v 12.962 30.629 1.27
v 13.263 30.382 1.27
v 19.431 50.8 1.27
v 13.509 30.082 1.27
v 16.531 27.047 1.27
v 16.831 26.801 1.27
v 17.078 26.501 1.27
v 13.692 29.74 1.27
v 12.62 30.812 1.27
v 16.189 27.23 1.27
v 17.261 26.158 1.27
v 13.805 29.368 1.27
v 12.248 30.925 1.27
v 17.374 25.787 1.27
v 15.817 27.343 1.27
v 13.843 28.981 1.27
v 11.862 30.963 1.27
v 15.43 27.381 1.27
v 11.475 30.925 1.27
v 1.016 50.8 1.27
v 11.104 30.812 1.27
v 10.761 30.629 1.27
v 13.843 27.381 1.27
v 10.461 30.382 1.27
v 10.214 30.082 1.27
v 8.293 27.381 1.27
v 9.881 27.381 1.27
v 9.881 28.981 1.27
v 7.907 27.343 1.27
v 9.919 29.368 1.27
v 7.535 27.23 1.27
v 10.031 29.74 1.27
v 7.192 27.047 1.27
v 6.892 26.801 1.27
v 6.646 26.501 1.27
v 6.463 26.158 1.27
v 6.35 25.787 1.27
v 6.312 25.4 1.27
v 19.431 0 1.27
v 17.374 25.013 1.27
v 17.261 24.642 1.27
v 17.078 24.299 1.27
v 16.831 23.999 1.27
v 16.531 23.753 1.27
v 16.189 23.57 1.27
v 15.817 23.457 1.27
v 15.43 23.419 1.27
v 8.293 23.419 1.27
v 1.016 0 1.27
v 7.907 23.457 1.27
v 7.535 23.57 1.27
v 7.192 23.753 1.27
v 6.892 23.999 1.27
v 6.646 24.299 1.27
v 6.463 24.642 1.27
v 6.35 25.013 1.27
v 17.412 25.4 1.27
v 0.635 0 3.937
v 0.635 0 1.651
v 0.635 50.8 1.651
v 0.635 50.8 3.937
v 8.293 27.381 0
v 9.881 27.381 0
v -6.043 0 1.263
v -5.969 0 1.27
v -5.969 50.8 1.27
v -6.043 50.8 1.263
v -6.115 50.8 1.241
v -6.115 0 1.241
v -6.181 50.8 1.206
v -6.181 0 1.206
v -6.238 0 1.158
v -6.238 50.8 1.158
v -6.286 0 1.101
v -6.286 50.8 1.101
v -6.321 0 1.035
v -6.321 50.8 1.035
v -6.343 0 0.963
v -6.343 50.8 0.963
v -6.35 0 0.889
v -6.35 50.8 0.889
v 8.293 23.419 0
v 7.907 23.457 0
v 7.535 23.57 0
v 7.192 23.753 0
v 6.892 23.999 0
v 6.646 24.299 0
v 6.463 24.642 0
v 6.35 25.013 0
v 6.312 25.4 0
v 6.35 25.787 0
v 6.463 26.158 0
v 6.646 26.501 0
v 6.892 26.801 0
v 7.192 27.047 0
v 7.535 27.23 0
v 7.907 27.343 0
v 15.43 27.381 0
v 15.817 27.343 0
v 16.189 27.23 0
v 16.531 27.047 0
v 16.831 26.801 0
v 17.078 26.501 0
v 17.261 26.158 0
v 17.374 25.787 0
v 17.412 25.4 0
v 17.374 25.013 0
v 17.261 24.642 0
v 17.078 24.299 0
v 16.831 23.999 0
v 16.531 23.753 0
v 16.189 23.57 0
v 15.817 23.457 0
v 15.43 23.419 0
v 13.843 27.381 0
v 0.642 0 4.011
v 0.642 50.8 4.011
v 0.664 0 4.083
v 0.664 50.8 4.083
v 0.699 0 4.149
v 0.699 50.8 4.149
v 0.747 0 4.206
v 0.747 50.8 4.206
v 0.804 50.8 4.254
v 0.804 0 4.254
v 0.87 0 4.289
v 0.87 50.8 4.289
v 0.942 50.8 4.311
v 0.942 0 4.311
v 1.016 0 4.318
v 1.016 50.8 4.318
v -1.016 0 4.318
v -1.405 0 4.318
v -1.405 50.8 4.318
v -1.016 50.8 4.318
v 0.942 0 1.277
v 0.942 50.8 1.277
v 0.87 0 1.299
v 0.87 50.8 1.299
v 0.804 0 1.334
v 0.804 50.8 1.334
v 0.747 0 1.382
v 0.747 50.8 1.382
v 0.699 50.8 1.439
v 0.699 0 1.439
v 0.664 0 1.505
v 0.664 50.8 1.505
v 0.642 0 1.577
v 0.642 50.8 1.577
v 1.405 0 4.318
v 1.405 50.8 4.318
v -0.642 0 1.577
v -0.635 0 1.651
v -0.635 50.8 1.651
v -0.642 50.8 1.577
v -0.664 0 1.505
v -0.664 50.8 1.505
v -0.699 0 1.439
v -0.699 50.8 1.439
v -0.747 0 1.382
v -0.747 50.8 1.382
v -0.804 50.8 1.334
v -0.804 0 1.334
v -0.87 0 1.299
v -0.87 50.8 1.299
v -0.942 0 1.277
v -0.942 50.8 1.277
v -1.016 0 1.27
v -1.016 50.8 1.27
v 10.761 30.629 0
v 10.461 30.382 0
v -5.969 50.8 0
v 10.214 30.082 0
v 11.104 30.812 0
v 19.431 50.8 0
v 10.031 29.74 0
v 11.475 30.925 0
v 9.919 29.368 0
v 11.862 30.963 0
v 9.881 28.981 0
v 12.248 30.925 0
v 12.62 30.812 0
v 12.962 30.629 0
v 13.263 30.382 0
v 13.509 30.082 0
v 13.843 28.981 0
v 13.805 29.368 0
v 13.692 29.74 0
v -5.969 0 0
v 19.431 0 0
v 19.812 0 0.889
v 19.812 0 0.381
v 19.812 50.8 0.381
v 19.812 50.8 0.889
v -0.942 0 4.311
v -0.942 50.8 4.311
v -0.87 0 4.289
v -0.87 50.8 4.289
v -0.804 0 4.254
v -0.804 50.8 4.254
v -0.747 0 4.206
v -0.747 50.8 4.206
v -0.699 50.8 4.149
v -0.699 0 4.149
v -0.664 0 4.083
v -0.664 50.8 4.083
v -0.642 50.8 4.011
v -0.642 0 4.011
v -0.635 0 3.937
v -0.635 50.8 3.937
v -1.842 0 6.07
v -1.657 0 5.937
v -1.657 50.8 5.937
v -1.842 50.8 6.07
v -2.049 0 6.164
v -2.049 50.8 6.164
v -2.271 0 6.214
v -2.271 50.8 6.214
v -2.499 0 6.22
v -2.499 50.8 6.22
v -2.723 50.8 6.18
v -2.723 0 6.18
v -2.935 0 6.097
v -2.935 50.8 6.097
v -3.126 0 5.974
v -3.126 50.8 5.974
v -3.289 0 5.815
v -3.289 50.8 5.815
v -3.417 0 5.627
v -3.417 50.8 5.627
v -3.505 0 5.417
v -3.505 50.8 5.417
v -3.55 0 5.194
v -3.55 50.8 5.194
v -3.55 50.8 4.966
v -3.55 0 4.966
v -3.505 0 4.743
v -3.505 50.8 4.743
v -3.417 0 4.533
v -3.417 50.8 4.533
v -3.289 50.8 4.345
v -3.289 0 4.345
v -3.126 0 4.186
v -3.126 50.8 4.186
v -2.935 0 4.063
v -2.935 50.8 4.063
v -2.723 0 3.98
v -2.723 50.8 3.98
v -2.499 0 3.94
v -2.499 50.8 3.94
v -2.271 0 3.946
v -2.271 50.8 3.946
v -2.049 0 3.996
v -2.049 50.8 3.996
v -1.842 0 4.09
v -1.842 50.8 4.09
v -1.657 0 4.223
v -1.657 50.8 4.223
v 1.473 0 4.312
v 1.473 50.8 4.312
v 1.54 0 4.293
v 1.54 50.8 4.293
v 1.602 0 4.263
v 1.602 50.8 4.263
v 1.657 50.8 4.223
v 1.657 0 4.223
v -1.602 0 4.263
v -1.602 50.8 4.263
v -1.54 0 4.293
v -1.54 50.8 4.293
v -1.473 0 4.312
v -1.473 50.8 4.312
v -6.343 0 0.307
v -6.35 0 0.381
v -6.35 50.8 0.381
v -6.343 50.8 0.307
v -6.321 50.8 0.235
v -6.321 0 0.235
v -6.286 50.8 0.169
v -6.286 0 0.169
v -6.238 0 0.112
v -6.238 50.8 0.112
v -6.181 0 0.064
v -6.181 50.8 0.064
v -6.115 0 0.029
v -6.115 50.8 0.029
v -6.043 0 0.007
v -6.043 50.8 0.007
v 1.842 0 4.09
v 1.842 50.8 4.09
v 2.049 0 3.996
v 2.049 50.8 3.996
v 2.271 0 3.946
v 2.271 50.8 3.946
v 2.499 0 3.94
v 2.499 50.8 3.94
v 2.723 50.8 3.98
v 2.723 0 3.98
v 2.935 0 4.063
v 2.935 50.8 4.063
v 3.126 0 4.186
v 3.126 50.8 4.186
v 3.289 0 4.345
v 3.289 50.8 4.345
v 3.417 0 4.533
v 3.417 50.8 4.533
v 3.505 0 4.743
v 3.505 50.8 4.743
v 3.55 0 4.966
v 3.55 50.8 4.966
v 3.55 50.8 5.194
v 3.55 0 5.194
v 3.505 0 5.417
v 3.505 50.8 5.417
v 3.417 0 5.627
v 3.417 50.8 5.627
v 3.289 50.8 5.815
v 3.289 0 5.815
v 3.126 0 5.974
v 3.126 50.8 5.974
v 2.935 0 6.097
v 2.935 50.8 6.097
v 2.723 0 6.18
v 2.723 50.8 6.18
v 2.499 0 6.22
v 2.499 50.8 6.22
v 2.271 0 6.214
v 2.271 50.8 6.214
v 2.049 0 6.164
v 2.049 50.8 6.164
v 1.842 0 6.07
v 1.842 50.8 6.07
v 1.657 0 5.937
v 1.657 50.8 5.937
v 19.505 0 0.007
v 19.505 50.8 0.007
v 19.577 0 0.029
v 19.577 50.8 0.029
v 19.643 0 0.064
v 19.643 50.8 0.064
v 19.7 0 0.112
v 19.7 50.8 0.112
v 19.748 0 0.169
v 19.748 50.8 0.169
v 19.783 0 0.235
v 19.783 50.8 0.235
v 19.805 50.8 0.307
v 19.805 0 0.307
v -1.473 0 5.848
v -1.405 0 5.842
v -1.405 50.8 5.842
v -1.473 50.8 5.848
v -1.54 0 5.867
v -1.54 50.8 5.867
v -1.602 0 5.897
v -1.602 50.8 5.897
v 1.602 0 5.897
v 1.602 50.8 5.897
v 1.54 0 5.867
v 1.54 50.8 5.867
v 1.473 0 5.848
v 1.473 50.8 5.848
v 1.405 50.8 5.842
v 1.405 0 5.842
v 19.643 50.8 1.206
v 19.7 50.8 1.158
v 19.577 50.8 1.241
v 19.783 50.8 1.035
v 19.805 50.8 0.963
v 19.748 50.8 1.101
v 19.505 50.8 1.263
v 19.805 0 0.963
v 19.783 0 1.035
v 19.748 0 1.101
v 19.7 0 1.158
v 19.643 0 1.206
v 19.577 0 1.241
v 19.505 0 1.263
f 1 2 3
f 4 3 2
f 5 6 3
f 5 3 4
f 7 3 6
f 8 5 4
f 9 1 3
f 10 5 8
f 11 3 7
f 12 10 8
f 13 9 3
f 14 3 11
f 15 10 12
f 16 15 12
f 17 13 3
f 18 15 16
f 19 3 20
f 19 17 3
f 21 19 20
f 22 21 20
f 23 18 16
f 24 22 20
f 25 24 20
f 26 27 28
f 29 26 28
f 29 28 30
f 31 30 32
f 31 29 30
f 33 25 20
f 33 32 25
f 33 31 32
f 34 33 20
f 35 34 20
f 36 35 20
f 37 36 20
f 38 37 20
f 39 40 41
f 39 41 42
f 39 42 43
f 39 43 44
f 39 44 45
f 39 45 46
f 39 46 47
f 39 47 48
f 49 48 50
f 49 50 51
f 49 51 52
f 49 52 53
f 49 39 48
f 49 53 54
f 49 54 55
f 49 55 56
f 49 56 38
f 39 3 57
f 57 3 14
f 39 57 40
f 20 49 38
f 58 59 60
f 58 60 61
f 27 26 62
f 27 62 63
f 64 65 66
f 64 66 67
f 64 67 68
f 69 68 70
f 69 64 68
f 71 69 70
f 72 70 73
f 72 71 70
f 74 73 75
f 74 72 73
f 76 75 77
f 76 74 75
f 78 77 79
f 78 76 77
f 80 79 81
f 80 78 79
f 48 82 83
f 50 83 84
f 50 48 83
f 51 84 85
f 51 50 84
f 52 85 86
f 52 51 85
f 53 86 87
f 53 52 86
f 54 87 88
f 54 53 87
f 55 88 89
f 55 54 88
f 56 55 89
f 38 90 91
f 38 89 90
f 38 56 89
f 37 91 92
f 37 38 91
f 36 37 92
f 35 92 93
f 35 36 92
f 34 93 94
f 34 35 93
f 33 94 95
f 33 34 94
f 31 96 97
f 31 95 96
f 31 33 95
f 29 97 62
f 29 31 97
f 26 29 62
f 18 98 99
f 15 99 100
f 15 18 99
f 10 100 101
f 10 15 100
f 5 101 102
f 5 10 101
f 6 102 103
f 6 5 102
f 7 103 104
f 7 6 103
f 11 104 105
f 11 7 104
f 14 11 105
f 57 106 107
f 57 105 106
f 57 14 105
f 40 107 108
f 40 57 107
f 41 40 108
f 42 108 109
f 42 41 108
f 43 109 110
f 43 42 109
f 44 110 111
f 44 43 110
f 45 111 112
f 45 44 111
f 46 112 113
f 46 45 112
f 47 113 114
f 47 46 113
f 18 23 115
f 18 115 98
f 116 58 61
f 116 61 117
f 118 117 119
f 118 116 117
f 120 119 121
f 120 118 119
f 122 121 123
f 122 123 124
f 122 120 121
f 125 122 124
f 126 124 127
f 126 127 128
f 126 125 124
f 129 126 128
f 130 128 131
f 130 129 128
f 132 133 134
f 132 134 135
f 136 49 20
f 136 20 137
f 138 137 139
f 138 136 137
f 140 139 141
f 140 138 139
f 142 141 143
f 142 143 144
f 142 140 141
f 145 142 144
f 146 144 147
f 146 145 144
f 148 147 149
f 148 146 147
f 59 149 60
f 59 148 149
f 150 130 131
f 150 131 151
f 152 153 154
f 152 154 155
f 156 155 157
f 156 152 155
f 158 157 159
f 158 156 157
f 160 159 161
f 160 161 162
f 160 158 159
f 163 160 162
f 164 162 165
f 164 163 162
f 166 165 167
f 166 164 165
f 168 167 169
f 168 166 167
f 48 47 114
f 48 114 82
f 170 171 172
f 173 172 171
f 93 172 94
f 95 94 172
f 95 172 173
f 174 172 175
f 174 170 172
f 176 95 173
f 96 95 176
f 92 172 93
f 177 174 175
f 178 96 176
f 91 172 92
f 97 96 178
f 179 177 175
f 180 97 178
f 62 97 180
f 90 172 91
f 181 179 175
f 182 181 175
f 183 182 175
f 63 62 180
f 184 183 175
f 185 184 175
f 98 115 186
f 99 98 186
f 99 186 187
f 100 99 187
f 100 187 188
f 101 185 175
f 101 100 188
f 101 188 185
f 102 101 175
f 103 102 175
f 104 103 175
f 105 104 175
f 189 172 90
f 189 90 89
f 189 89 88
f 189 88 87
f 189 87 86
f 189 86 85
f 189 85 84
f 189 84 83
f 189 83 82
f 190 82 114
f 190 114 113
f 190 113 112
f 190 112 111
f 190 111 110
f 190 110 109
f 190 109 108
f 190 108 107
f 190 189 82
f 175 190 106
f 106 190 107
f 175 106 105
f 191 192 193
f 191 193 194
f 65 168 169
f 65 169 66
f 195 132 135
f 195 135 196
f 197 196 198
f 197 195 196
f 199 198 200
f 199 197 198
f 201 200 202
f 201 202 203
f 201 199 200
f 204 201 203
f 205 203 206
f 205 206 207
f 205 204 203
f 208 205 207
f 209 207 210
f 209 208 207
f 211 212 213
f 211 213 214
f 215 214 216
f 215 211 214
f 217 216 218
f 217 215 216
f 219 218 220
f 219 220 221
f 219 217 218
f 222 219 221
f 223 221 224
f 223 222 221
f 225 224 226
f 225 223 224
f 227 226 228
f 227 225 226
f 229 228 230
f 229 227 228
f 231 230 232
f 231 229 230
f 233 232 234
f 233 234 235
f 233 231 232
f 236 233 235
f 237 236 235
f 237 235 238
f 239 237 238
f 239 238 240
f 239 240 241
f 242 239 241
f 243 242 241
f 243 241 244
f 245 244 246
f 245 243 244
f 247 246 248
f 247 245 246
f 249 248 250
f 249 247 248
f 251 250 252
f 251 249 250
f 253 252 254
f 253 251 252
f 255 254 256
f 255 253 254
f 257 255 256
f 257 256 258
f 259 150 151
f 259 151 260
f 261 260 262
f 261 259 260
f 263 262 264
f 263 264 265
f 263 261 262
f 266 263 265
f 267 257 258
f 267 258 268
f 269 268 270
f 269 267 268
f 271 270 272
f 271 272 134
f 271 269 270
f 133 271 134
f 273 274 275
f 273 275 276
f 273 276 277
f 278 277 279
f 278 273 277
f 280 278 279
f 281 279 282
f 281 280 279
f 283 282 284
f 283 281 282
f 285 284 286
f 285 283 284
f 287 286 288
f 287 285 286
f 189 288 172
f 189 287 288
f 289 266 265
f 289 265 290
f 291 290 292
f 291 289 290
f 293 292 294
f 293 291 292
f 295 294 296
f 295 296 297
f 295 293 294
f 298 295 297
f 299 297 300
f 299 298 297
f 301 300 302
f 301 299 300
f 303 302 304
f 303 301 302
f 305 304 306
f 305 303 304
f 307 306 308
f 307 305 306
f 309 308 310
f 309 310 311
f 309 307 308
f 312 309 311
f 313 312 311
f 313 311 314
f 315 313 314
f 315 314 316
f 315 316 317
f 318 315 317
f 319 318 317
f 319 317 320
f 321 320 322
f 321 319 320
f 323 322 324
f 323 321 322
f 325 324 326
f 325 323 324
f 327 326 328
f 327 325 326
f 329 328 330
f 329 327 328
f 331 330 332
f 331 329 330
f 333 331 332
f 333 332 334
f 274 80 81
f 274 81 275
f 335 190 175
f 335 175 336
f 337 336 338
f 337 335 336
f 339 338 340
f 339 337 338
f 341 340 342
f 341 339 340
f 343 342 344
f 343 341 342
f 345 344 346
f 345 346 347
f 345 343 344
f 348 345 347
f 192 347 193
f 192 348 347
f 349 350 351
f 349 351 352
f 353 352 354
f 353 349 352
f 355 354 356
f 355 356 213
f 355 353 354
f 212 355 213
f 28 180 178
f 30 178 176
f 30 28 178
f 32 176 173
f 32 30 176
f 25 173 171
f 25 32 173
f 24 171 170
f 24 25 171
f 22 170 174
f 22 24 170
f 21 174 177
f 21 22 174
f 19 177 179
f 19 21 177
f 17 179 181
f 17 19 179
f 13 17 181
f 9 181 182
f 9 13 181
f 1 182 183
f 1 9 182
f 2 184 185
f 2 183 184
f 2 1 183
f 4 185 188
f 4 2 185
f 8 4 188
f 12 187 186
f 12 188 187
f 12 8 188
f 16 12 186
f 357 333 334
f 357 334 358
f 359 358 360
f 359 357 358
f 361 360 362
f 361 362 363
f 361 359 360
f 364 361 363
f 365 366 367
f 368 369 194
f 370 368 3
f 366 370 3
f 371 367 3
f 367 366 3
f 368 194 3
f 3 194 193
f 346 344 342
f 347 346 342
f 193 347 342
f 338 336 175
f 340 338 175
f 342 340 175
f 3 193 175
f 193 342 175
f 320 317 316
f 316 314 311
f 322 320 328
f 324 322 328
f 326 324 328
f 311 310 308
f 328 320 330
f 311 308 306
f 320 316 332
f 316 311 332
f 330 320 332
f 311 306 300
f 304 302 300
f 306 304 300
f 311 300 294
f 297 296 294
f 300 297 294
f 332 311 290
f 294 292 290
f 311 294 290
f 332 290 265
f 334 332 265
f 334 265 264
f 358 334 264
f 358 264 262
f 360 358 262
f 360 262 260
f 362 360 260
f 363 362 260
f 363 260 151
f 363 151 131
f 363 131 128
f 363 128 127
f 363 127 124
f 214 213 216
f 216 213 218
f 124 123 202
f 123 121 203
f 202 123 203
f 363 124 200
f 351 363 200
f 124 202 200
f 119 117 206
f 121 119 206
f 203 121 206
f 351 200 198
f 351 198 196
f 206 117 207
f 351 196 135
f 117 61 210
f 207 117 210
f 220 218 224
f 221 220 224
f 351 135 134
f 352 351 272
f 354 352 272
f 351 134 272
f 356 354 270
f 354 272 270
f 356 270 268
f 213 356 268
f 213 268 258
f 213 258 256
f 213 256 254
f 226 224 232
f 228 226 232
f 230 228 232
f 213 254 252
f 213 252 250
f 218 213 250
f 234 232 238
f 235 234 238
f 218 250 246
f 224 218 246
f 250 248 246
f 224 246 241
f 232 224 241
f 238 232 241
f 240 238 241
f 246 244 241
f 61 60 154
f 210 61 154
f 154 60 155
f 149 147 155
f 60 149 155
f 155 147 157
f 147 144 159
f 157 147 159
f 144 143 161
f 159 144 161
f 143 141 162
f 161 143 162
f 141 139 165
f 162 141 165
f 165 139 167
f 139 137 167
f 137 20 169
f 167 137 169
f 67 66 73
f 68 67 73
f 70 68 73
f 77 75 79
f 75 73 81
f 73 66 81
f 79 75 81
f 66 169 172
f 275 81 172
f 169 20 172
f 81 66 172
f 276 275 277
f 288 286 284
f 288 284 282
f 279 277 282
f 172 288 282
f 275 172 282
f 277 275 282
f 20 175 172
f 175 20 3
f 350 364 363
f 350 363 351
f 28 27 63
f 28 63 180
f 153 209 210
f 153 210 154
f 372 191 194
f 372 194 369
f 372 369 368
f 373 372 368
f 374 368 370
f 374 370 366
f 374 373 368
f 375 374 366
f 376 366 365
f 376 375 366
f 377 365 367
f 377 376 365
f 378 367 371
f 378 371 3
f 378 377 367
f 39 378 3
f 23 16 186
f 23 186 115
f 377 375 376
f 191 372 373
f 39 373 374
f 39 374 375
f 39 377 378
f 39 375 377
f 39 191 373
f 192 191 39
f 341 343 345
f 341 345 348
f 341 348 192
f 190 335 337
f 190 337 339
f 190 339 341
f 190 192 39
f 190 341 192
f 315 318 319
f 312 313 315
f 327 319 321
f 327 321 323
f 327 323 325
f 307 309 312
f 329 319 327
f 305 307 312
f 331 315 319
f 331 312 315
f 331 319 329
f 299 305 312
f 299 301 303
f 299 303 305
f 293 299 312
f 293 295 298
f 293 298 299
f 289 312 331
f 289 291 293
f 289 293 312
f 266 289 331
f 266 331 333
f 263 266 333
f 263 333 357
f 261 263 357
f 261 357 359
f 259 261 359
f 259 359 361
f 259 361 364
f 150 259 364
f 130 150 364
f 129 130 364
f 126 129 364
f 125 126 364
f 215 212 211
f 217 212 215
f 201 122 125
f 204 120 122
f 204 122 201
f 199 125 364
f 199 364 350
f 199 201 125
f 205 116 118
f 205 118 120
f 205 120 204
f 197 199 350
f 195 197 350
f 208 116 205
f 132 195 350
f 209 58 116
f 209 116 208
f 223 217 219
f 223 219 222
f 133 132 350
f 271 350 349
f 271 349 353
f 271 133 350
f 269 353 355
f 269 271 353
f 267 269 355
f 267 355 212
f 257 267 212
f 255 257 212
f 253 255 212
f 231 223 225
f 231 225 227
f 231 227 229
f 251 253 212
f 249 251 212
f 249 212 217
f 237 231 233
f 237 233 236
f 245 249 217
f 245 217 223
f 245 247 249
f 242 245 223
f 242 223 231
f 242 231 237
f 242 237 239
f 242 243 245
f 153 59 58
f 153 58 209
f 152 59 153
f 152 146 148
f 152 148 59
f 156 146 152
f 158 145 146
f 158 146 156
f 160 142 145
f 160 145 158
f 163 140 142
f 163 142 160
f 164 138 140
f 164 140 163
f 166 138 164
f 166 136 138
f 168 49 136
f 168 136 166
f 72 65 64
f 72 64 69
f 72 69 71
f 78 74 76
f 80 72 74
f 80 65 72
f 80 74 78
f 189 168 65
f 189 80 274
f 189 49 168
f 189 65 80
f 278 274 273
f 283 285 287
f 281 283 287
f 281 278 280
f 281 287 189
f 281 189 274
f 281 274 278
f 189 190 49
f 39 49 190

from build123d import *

# Parameters (mm, degrees)
BOSS_EXTRUDE1_DEPTH = 50.8
CUT_EXTRUDE1_DEPTH  = 2.27


with BuildPart() as part:
    # Sketch2 → Boss-Extrude1 (new body)
    with BuildSketch(Plane(origin=(0, 0, 0), x_dir=(1, 0, 0), z_dir=(0, 1, 0))):
        with BuildLine():
            Line((-5.969, 0), (19.431, 0))
            ThreePointArc((19.431, 0), (19.700407684, -0.111592316), (19.812, -0.381))
            Line((19.812, -0.381), (19.812, -0.889))
            ThreePointArc((19.812, -0.889), (19.700407684, -1.158407684), (19.431, -1.27))
            Line((19.431, -1.27), (1.016, -1.27))
            ThreePointArc((1.016, -1.27), (0.746592316, -1.381592316), (0.635, -1.651))
            Line((0.635, -1.651), (0.635, -3.937))
            ThreePointArc((0.635, -3.937), (0.746592316, -4.206407684), (1.016, -4.318))
            Line((1.016, -4.318), (1.40496875, -4.318))
            ThreePointArc((1.40496875, -4.318), (1.539672592, -4.293392866), (1.656976563, -4.22275))
            ThreePointArc((1.656976563, -4.22275), (3.556, -5.08), (1.656976563, -5.93725))
            ThreePointArc((1.656976563, -5.93725), (1.539672592, -5.866607134), (1.40496875, -5.842))
            Line((1.40496875, -5.842), (-1.40496875, -5.842))
            ThreePointArc((-1.40496875, -5.842), (-1.539672592, -5.866607134), (-1.656976563, -5.93725))
            ThreePointArc((-1.656976563, -5.93725), (-3.556, -5.08), (-1.656976563, -4.22275))
            ThreePointArc((-1.656976563, -4.22275), (-1.539672592, -4.293392866), (-1.40496875, -4.318))
            Line((-1.40496875, -4.318), (-1.016, -4.318))
            ThreePointArc((-1.016, -4.318), (-0.746592316, -4.206407684), (-0.635, -3.937))
            Line((-0.635, -3.937), (-0.635, -1.651))
            ThreePointArc((-0.635, -1.651), (-0.746592316, -1.381592316), (-1.016, -1.27))
            Line((-1.016, -1.27), (-5.969, -1.27))
            ThreePointArc((-5.969, -1.27), (-6.238407684, -1.158407684), (-6.35, -0.889))
            Line((-6.35, -0.889), (-6.35, -0.381))
            ThreePointArc((-6.35, -0.381), (-6.238407684, -0.111592316), (-5.969, 0))
        make_face()
    extrude(amount=BOSS_EXTRUDE1_DEPTH)

    # Sketch3 → Cut-Extrude1 (cut, through all)
    with BuildSketch(Plane.XY.offset(1.27)):
        with BuildLine():
            Line((8.2931, 27.3812), (9.8806, 27.3812))
            Line((9.8806, 27.3812), (9.8806, 28.9814))
            ThreePointArc((9.8806, 28.9814), (11.8618, 30.9626), (13.843, 28.9814))
            Line((13.843, 28.9814), (13.843, 27.3812))
            Line((13.843, 27.3812), (15.4305, 27.3812))
            ThreePointArc((15.4305, 27.3812), (17.4117, 25.4), (15.4305, 23.4188))
            Line((15.4305, 23.4188), (8.2931, 23.4188))
            ThreePointArc((8.2931, 23.4188), (6.3119, 25.4), (8.2931, 27.3812))
        make_face()
    extrude(amount=-CUT_EXTRUDE1_DEPTH, mode=Mode.SUBTRACT)


solid = part.part
